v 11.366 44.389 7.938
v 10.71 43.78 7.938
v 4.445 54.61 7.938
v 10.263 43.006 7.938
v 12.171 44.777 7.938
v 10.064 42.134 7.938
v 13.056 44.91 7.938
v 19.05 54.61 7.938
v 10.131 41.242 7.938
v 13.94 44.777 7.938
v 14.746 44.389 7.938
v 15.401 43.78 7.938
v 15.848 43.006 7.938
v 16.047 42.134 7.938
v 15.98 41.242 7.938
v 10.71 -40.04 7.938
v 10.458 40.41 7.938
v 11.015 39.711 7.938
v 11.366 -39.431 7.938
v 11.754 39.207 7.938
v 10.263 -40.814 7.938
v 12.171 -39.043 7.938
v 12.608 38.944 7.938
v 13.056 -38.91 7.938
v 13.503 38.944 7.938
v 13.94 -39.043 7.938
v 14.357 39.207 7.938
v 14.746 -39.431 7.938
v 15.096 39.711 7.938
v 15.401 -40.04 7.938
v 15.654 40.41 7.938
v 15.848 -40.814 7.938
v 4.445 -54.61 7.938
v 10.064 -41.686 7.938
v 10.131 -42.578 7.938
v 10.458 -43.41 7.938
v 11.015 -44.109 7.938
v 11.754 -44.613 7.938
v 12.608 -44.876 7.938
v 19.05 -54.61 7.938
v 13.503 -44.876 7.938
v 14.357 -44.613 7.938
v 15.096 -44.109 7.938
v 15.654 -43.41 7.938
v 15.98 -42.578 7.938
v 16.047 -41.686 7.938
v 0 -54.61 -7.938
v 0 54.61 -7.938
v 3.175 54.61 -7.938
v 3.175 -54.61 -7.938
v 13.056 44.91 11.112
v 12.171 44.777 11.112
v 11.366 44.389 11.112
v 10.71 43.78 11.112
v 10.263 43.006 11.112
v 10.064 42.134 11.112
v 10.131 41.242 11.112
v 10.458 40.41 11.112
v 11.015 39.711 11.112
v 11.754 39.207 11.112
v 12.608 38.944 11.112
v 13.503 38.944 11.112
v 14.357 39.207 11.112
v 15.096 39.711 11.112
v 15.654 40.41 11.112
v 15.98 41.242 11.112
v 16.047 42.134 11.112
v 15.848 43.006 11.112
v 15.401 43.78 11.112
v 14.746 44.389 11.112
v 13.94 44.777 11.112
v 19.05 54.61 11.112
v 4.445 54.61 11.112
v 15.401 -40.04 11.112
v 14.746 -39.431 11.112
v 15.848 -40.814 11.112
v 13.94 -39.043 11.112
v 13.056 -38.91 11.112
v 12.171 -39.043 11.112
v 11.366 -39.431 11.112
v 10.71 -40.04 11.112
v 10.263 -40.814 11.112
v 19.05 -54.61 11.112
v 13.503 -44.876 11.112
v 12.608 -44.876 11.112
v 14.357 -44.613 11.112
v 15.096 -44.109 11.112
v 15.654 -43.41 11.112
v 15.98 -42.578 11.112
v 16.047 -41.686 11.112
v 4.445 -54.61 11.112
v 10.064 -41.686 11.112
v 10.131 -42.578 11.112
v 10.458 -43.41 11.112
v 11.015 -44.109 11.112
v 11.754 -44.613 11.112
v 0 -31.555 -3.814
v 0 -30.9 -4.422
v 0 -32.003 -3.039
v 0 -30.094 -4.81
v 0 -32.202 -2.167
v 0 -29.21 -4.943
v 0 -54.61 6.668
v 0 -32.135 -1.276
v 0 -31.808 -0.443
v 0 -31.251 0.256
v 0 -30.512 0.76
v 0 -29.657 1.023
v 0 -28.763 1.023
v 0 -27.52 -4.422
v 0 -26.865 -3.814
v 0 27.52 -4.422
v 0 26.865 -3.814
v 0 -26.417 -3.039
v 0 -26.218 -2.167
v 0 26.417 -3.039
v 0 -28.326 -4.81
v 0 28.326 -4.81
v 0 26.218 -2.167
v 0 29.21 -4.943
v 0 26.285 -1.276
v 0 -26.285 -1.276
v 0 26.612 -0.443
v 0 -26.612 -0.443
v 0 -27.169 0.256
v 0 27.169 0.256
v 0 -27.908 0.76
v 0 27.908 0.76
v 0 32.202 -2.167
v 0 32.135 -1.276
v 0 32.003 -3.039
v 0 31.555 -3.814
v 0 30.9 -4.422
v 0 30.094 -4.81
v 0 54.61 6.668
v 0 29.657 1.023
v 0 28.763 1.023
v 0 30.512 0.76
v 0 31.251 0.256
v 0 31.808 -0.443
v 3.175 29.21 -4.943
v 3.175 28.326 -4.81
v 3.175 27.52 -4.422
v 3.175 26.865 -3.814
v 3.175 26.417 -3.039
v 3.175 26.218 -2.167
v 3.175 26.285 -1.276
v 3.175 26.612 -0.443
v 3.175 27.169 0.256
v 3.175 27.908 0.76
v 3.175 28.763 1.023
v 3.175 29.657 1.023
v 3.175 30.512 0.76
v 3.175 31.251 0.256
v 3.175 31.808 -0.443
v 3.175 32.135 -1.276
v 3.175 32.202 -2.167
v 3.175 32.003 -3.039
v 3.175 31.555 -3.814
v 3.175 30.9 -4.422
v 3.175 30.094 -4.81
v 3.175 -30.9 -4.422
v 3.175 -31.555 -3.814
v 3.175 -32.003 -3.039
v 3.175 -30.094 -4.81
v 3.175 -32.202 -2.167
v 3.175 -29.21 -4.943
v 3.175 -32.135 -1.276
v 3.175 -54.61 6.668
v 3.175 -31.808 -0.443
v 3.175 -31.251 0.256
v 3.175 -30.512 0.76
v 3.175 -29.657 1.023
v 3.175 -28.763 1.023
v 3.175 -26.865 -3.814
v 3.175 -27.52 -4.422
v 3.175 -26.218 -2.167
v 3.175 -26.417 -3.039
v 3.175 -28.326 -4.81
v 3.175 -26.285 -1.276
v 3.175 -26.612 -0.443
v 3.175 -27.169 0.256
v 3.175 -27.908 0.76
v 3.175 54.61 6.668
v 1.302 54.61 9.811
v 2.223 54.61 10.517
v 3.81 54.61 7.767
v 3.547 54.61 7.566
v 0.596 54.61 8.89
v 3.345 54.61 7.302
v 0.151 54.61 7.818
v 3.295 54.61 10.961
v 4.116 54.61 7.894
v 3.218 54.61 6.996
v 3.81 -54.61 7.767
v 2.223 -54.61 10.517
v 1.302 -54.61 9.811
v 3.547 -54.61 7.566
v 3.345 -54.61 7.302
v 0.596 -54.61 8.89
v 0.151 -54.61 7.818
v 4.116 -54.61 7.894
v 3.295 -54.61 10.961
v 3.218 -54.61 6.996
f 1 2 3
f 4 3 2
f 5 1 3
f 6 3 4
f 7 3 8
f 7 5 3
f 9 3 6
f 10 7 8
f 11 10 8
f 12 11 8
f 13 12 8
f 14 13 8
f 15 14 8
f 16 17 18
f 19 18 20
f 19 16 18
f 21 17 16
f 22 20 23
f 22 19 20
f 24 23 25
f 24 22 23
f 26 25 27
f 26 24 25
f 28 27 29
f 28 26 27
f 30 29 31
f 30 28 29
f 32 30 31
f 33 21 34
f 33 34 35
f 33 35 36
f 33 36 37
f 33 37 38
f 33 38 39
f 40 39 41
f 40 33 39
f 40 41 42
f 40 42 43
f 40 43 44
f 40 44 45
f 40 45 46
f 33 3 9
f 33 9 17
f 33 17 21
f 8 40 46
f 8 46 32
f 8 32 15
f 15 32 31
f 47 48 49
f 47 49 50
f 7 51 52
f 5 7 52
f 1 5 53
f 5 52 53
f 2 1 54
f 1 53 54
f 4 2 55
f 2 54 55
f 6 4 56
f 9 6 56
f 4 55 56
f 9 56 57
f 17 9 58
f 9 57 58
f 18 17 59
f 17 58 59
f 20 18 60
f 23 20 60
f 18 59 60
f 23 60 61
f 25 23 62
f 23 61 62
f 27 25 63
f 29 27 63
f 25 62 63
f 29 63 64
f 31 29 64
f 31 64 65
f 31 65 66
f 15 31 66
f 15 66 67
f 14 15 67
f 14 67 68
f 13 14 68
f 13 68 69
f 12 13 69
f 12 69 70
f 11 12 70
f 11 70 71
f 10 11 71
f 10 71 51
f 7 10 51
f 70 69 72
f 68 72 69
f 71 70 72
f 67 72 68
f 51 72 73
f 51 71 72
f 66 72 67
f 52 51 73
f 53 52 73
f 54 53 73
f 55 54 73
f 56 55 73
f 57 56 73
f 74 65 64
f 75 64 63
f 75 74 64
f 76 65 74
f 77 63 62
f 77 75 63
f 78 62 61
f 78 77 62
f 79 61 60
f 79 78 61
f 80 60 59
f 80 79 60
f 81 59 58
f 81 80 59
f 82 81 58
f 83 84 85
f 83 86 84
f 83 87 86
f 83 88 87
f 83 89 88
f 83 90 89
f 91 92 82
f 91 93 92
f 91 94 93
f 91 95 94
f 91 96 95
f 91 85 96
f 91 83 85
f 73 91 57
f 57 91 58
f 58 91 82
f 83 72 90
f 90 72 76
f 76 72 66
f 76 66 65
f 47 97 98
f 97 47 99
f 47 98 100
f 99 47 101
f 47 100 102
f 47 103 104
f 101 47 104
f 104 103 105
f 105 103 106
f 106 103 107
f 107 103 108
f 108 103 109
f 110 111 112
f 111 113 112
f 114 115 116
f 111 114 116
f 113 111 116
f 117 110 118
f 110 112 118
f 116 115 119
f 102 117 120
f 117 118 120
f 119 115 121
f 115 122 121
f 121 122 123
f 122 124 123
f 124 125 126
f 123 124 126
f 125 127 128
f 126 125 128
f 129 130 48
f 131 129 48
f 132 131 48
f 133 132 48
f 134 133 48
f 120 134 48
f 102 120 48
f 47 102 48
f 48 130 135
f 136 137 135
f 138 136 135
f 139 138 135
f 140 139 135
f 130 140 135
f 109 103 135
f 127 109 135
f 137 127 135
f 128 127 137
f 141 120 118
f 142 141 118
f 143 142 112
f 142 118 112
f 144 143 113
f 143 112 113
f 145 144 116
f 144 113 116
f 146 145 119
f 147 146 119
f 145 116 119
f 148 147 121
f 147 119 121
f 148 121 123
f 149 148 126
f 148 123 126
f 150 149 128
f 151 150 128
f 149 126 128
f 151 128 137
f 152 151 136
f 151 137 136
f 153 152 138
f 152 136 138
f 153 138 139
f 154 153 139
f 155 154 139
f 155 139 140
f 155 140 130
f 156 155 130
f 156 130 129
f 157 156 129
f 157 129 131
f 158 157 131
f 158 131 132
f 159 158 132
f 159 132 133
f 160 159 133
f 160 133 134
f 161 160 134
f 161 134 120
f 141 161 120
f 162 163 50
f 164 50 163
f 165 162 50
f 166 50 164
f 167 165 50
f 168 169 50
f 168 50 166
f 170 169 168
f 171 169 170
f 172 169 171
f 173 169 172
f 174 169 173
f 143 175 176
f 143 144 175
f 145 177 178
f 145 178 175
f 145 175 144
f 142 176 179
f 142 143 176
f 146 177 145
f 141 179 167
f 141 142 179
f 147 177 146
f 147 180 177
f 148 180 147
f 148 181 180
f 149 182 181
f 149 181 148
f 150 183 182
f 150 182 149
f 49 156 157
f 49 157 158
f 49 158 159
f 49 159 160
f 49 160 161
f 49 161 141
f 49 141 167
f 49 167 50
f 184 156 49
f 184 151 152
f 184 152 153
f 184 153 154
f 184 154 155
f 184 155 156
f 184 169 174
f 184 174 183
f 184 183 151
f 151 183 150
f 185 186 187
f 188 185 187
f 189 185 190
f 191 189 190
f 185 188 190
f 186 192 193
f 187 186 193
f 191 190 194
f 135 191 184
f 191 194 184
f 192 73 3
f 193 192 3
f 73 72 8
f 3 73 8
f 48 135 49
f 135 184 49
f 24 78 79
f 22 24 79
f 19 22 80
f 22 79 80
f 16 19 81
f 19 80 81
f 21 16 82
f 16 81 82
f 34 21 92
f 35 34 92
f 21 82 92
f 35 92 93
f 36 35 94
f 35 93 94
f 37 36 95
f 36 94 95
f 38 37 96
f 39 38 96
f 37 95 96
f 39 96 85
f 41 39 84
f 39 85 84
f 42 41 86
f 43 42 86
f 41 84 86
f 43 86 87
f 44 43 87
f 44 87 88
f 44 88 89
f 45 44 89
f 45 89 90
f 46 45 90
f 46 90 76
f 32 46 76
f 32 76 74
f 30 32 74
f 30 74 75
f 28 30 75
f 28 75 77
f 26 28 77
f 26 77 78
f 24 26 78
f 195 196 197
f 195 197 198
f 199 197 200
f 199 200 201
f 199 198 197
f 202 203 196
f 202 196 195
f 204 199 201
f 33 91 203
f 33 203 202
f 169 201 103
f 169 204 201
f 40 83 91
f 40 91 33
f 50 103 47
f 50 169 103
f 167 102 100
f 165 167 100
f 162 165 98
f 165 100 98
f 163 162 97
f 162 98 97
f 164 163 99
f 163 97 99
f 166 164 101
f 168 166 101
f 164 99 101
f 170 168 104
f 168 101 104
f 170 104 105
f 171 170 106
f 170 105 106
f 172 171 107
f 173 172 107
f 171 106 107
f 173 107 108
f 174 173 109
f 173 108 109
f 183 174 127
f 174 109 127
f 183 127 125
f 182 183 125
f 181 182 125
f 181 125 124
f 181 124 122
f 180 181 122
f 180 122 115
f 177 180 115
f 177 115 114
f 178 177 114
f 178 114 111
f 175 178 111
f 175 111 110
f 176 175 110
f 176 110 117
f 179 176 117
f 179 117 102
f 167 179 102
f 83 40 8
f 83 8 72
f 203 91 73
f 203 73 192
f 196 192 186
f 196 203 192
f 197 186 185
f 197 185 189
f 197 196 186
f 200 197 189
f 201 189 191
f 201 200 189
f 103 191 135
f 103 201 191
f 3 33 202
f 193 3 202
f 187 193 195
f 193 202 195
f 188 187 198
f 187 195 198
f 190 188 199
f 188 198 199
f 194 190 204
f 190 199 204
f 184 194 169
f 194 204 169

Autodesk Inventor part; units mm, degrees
ref_plane "YZ Plane" through (0, 0, 0) normal (1, 0, 0) x (0, 1, 0)
ref_plane "XZ Plane" through (0, 0, 0) normal (0, 1, 0) x (-1, 0, 0)
ref_plane "XY Plane" through (0, 0, 0) normal (0, 0, 1) x (1, 0, 0)
sketch "Sketch1" plane through (0, 0, 0) normal (1, 0, 0) x (0, 1, 0)
  point P0 (0, 0)
sketch "Sketch2" plane through (0, 0, 0) normal (1, 0, 0) x (0, 1, 0)
  line L0 (-54.61, 7.9375) -> (54.61, 7.9375)
  line L1 (54.61, 7.9375) -> (54.61, -7.9375)
  line L2 (54.61, -7.9375) -> (-54.61, -7.9375)
  line L3 (-54.61, -7.9375) -> (-54.61, 7.9375)
  line L4 (-54.61, 7.9375) -> (54.61, -7.9375) construction
  line L5 (54.61, 7.9375) -> (-54.61, -7.9375) construction
  point P0 (0, 0)
  dimension "d0" = 15.875
  dimension "d1" = 109.22
extrude "Extrusion1" add sketch "Sketch2" along normal blind 3.175
sketch "Sketch3" plane through (3.175, -54.61, 7.9375) normal (0, 0, 1) x (1, 0, 0)
  line L0 (0, 109.22) -> (0, 0)
  line L1 (0, 0) -> (15.875, 0)
  line L2 (15.875, 0) -> (15.875, 109.22)
  line L3 (15.875, 109.22) -> (0, 109.22)
edge flange "Flange1" height 19.05 angle 90 thickness 3.175 bend radius 1.27 thickness toward (0, 0, 1) relief tear relief width 3.175 relief depth 1.5875 edges at (3.175, 0, 7.9375) wall of the first edge with corners at (3.175, 54.61, 7.9375) (3.175, -54.61, 7.9375) (19.05, -54.61, 7.9375) (19.05, 54.61, 7.9375)
bend "Bend1"
corner "Corner1"
sketch "Sketch4" plane through (3.175, 0, 0) normal (1, 0, 0) x (0, 0, -1)
  line L0 (1.9431, 29.21) -> (1.9431, -29.21) construction
  line L1 (7.9375, -54.61) -> (7.9375, 54.61) construction
  line L2 (7.9375, 54.61) -> (-6.6675, 54.61) projected
  line L3 (-6.6675, -54.61) -> (7.9375, -54.61) projected
  point P0 (0, 0)
  dimension "d14" = 5.9944
  dimension "d15" = 25.4
  dimension "d16" = 25.4
hole "Hole1" at (3.175, 29.21, -1.9431) at (3.175, -29.21, -1.9431) direction (-1, 0, 0) diameter 6 end through all
sketch "Sketch5" plane through (19.05, -54.61, 7.9375) normal (0, 0, -1) x (-1, 0, 0)
  line L0 (5.9944, 12.7) -> (5.9944, 96.52) construction
  line L1 (0, 109.22) -> (0, 0) construction
  line L2 (0, 109.22) -> (14.605, 109.22) construction
  line L3 (0, 0) -> (14.605, 0) construction
  point P0 (19.05, 54.61)
  dimension "d24" = 5.9944
  dimension "d25" = 12.7
  dimension "d26" = 12.7
hole "Hole2" at (13.0556, 41.91, 7.9375) at (13.0556, -41.91, 7.9375) direction (0, 0, 1) diameter 6 end through all
sketch "Sketch6" plane through (3.175, 0, 0) normal (1, 0, 0) x (0, 0, -1)
  circle A0 centre (1.9431, 29.21) radius 3 projected
  point P0 (0, 0)
  point P1 (4.9431, 29.21)
equation "\"d22\" = Thickness"
equation "\"d32\" = Thickness"
equation "\"d4\" = BendReliefWidth"
equation "\"d5\" = BendReliefDepth"
equation "\"d6\" = MinimumRemnant"
equation "\"d7\" = BendRadius"
equation "\"d11\" = CornerReliefSize"
equation "\"d12\" = GapSize"
equation "\"d13\" = JacobiRadiusSize"
equation "\"BendRadius\" = Thickness"
equation "\"BendReliefWidth\" = Thickness"
equation "\"BendReliefDepth\" = 0.5 * Thickness"
equation "\"CornerReliefSize\" = 4 * Thickness"
equation "\"MinimumRemnant\" = 2 * Thickness"
equation "\"TransitionRadius\" = BendRadius"
equation "\"JacobiRadiusSize\" = BendRadius"
equation "\"GapSize\" = Thickness"
equation "\"Thickness\" = 3.175"
properties part number "PCB_brackets" material "Aluminum 6061"
